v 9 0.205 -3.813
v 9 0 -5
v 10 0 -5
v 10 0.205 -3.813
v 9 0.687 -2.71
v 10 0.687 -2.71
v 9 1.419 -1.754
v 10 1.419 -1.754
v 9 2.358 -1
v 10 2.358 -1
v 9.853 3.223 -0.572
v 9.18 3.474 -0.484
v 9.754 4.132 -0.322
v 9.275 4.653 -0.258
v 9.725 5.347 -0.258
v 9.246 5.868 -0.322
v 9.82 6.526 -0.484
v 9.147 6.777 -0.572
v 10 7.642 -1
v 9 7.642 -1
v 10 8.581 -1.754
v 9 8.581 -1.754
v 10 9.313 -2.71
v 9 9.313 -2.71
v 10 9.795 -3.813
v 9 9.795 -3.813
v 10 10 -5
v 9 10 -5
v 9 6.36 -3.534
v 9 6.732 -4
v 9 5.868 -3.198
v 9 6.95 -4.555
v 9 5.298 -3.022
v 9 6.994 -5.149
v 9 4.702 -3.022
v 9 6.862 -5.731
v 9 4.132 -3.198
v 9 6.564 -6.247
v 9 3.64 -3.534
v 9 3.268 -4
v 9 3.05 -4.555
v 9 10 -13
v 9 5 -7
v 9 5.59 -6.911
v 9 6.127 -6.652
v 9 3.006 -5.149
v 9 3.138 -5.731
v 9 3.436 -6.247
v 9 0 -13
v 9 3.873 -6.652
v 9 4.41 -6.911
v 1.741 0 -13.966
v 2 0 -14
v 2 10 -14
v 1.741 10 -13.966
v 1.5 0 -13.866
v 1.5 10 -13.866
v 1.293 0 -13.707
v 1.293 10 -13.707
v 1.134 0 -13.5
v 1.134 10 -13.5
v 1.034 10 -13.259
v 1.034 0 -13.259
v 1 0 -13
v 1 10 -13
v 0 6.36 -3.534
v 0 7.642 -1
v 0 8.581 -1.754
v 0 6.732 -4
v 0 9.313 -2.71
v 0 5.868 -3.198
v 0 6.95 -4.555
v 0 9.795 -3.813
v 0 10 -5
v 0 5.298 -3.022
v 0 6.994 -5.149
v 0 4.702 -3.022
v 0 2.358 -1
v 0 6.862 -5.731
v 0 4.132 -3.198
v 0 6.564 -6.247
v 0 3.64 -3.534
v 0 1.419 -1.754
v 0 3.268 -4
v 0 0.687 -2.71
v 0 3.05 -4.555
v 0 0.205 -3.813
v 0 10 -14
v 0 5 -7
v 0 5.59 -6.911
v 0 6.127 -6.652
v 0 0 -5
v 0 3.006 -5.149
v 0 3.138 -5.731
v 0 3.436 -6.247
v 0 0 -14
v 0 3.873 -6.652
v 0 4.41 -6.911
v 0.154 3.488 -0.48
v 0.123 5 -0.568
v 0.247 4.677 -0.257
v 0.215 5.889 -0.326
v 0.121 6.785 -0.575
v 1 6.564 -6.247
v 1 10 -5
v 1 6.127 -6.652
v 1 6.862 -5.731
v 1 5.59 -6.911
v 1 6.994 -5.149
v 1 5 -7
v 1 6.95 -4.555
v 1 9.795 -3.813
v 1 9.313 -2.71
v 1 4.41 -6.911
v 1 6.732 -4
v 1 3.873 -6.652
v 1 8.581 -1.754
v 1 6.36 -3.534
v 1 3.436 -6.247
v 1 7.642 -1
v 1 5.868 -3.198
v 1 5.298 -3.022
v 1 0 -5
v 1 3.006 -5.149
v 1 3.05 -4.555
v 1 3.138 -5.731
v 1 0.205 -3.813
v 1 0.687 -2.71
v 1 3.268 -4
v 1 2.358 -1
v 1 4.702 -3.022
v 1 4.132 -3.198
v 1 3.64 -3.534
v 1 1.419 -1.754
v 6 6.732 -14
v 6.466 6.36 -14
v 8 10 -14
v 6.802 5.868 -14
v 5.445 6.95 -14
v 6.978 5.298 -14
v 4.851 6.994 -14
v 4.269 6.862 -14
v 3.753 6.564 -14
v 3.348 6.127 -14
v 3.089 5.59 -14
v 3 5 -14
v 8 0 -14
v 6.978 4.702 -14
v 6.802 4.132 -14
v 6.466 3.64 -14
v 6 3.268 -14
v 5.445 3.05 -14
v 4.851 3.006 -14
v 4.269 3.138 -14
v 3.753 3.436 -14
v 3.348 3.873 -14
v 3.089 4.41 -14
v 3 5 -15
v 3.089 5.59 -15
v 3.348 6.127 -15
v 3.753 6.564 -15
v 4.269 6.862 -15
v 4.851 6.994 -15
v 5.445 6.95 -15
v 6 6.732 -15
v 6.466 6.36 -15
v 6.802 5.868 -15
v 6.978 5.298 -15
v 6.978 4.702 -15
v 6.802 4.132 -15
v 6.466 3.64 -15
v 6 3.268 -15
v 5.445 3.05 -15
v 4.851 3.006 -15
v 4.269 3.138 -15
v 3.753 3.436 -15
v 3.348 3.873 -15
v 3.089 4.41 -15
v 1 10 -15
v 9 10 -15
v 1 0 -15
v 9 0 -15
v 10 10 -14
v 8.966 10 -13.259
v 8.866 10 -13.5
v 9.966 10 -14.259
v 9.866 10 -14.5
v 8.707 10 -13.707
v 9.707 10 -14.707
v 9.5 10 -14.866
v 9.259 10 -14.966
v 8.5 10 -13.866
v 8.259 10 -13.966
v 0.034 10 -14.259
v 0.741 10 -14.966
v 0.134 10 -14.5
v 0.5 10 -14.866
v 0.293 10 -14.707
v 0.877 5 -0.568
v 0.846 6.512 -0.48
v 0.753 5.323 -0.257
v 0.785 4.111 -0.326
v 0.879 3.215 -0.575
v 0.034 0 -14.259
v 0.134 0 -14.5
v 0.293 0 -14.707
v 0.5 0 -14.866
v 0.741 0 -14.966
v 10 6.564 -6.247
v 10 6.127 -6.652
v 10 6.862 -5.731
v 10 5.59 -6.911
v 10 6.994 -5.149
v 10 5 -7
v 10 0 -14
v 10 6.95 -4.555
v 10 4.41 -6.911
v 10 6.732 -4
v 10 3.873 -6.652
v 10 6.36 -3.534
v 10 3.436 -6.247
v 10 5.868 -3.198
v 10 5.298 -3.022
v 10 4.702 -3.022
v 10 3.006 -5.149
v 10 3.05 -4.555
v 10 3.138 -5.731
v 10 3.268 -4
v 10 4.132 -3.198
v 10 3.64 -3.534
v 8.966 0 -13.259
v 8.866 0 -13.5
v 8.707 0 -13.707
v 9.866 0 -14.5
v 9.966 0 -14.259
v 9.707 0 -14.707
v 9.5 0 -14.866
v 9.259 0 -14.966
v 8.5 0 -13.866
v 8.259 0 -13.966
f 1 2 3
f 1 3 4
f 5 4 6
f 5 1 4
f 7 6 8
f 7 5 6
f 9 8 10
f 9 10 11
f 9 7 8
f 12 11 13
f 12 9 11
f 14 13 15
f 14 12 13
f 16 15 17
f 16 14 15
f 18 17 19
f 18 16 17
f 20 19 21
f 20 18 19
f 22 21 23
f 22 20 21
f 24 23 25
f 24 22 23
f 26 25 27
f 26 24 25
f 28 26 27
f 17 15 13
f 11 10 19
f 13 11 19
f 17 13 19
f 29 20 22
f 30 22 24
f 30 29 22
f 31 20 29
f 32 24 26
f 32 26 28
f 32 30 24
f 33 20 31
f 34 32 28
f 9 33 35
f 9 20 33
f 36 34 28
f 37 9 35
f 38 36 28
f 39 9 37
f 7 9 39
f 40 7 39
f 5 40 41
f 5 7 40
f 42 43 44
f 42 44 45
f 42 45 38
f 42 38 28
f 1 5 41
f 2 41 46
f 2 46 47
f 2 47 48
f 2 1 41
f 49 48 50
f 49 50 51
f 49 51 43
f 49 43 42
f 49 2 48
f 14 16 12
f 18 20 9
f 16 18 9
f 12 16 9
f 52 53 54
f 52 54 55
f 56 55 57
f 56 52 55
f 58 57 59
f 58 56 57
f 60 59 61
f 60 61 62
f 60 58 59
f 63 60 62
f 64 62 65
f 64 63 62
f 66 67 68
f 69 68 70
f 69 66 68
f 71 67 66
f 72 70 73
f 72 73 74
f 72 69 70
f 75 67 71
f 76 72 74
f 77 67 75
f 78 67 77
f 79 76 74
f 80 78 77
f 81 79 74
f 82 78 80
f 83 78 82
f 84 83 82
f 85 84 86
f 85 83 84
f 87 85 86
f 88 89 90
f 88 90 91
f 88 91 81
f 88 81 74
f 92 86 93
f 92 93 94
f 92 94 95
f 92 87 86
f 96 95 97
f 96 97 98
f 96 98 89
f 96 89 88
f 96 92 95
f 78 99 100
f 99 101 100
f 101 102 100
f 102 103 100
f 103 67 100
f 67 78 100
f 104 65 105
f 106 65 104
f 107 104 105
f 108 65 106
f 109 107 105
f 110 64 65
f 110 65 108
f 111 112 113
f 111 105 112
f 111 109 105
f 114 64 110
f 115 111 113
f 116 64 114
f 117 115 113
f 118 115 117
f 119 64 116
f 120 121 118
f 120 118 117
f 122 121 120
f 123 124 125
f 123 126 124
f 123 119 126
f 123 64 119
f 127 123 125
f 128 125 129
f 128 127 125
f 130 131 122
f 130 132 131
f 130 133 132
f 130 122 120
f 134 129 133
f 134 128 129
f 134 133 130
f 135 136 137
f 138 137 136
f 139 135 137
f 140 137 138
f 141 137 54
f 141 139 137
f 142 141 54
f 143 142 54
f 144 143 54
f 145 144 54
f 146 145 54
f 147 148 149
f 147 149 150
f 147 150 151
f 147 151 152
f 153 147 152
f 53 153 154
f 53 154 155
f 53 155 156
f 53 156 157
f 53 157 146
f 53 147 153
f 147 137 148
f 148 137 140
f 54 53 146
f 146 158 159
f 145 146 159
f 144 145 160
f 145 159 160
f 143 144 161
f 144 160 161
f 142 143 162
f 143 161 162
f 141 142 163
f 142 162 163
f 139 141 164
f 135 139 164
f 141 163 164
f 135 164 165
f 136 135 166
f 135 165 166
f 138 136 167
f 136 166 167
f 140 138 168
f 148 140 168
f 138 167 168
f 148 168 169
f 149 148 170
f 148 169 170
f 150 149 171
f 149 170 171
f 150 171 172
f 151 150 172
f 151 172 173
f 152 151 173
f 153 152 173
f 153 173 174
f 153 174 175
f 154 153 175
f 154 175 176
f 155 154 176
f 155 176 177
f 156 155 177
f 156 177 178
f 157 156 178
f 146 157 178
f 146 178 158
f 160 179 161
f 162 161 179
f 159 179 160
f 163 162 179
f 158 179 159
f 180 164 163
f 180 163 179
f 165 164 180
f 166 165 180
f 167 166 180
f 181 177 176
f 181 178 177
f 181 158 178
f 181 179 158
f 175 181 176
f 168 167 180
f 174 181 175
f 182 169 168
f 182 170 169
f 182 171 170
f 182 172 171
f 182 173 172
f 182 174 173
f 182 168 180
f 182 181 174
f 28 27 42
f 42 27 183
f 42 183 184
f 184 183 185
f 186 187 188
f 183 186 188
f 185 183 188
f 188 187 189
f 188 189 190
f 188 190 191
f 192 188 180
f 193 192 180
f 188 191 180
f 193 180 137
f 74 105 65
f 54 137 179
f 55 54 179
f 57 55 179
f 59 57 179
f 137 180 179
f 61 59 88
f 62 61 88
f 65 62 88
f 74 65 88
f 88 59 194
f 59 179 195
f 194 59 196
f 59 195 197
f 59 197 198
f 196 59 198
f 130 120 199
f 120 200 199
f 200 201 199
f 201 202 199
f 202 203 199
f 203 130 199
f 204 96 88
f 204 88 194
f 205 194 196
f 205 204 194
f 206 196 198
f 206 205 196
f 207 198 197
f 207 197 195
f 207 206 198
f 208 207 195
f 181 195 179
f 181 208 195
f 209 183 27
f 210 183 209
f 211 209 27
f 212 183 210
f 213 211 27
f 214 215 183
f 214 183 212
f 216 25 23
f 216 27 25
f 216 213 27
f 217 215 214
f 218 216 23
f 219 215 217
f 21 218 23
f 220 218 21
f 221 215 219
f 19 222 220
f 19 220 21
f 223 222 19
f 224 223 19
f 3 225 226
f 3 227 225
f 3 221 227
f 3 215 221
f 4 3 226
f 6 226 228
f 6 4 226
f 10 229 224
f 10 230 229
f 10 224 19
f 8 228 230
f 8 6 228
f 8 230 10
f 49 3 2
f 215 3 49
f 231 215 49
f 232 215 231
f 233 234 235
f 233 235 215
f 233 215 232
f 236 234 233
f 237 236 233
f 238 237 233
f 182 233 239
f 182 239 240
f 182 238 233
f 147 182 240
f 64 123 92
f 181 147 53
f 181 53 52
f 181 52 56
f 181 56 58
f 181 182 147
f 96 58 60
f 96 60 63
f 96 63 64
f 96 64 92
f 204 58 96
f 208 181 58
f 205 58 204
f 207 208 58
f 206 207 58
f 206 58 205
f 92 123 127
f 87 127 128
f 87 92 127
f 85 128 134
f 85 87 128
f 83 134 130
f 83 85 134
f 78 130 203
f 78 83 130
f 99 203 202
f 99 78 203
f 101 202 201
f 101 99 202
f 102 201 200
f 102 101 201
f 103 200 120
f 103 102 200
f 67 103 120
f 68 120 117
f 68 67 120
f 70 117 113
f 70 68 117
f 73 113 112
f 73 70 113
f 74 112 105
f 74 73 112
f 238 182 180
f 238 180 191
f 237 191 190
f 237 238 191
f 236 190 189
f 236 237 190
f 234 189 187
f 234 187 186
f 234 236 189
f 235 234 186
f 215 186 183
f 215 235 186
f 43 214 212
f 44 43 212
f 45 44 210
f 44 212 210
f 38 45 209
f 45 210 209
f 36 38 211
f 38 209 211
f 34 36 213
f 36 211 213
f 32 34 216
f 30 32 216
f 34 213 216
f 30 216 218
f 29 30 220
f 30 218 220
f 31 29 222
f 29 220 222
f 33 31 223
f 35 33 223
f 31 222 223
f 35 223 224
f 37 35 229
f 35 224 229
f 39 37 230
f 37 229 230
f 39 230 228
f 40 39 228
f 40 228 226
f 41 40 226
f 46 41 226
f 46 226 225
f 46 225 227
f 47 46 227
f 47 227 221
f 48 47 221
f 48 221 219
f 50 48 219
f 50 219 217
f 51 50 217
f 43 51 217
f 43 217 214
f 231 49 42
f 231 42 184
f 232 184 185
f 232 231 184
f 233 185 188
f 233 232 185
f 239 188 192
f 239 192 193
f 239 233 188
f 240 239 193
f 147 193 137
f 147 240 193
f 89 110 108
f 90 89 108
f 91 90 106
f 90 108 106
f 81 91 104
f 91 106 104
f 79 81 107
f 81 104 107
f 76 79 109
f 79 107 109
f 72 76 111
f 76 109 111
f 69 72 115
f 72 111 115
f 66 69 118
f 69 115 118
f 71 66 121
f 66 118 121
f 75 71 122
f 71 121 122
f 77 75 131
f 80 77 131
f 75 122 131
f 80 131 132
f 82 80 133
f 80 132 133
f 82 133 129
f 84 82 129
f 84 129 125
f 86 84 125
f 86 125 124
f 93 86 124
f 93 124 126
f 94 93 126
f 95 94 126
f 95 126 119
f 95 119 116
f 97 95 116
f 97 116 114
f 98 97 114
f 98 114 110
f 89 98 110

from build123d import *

# Parameters (mm, degrees)
EXTRUDE_1_DEPTH      = 10
SKETCH_3_R           = 2
CUT_EXTRUDE_3_DEPTH  = 10
CUT_EXTRUDE_19_DEPTH = 10
SKETCH_15_R          = 2
CUT_EXTRUDE_20_DEPTH = 10


with BuildPart() as part:
    # Эскиз1 → Бобышка-Вытянуть1 (new body)
    with BuildSketch(Plane(origin=(0, 0, 0), x_dir=(1, 0, 0), z_dir=(0, 1, 0))):
        with BuildLine():
            Line((0, 1), (0, 14))
            ThreePointArc((0, 14), (0.292893219, 14.707106781), (1, 15))
            Line((1, 15), (9, 15))
            ThreePointArc((9, 15), (9.707106781, 14.707106781), (10, 14))
            Line((10, 14), (10, 1))
            add(Edge.make_bspline(
                [(9, 1), (9.166666667, 0.5), (9.5, -0.5), (9.833333333, 0.5), (10, 1)],
                knots=[0, 0, 0, 0, 0.5, 1, 1, 1, 1], degree=3))
            Line((9, 1), (9, 13))
            ThreePointArc((9, 13), (8.707106781, 13.707106781), (8, 14))
            Line((8, 14), (2, 14))
            ThreePointArc((2, 14), (1.292893219, 13.707106781), (1, 13))
            Line((1, 13), (1, 1))
            add(Edge.make_bspline(
                [(0, 1), (0.5, -1), (1, 1)],
                knots=[0, 0, 0, 1, 1, 1], degree=2))
        make_face()
    extrude(amount=EXTRUDE_1_DEPTH)

    # Эскиз3 → Вырез-Вытянуть3 (cut)
    with BuildSketch(Plane(origin=(10, 0, 0), x_dir=(0, 0, -1), z_dir=(1, 0, 0))):
        with Locations((5, 5)):
            Circle(SKETCH_3_R)
    extrude(amount=-CUT_EXTRUDE_3_DEPTH, mode=Mode.SUBTRACT)

    # Эскиз14 → Вырез-Вытянуть19 (cut)
    with BuildSketch(Plane(origin=(0, 0, 0), x_dir=(0, 0, -1), z_dir=(1, 0, 0))):
        with BuildLine():
            Line((5, 10), (0, 10))
            Line((0, 10), (0, 0))
            Line((0, 0), (5, 0))
            ThreePointArc((5, 0), (0.246325104, 5), (5, 10))
        make_face()
    extrude(amount=CUT_EXTRUDE_19_DEPTH, mode=Mode.SUBTRACT)

    # Эскиз15 → Вырез-Вытянуть20 (cut)
    with BuildSketch(Plane(origin=(0, 0, -15), x_dir=(-1, 0, 0), z_dir=(0, 0, -1))):
        with Locations((-5, 5)):
            Circle(SKETCH_15_R)
    extrude(amount=-CUT_EXTRUDE_20_DEPTH, mode=Mode.SUBTRACT)


solid = part.part
